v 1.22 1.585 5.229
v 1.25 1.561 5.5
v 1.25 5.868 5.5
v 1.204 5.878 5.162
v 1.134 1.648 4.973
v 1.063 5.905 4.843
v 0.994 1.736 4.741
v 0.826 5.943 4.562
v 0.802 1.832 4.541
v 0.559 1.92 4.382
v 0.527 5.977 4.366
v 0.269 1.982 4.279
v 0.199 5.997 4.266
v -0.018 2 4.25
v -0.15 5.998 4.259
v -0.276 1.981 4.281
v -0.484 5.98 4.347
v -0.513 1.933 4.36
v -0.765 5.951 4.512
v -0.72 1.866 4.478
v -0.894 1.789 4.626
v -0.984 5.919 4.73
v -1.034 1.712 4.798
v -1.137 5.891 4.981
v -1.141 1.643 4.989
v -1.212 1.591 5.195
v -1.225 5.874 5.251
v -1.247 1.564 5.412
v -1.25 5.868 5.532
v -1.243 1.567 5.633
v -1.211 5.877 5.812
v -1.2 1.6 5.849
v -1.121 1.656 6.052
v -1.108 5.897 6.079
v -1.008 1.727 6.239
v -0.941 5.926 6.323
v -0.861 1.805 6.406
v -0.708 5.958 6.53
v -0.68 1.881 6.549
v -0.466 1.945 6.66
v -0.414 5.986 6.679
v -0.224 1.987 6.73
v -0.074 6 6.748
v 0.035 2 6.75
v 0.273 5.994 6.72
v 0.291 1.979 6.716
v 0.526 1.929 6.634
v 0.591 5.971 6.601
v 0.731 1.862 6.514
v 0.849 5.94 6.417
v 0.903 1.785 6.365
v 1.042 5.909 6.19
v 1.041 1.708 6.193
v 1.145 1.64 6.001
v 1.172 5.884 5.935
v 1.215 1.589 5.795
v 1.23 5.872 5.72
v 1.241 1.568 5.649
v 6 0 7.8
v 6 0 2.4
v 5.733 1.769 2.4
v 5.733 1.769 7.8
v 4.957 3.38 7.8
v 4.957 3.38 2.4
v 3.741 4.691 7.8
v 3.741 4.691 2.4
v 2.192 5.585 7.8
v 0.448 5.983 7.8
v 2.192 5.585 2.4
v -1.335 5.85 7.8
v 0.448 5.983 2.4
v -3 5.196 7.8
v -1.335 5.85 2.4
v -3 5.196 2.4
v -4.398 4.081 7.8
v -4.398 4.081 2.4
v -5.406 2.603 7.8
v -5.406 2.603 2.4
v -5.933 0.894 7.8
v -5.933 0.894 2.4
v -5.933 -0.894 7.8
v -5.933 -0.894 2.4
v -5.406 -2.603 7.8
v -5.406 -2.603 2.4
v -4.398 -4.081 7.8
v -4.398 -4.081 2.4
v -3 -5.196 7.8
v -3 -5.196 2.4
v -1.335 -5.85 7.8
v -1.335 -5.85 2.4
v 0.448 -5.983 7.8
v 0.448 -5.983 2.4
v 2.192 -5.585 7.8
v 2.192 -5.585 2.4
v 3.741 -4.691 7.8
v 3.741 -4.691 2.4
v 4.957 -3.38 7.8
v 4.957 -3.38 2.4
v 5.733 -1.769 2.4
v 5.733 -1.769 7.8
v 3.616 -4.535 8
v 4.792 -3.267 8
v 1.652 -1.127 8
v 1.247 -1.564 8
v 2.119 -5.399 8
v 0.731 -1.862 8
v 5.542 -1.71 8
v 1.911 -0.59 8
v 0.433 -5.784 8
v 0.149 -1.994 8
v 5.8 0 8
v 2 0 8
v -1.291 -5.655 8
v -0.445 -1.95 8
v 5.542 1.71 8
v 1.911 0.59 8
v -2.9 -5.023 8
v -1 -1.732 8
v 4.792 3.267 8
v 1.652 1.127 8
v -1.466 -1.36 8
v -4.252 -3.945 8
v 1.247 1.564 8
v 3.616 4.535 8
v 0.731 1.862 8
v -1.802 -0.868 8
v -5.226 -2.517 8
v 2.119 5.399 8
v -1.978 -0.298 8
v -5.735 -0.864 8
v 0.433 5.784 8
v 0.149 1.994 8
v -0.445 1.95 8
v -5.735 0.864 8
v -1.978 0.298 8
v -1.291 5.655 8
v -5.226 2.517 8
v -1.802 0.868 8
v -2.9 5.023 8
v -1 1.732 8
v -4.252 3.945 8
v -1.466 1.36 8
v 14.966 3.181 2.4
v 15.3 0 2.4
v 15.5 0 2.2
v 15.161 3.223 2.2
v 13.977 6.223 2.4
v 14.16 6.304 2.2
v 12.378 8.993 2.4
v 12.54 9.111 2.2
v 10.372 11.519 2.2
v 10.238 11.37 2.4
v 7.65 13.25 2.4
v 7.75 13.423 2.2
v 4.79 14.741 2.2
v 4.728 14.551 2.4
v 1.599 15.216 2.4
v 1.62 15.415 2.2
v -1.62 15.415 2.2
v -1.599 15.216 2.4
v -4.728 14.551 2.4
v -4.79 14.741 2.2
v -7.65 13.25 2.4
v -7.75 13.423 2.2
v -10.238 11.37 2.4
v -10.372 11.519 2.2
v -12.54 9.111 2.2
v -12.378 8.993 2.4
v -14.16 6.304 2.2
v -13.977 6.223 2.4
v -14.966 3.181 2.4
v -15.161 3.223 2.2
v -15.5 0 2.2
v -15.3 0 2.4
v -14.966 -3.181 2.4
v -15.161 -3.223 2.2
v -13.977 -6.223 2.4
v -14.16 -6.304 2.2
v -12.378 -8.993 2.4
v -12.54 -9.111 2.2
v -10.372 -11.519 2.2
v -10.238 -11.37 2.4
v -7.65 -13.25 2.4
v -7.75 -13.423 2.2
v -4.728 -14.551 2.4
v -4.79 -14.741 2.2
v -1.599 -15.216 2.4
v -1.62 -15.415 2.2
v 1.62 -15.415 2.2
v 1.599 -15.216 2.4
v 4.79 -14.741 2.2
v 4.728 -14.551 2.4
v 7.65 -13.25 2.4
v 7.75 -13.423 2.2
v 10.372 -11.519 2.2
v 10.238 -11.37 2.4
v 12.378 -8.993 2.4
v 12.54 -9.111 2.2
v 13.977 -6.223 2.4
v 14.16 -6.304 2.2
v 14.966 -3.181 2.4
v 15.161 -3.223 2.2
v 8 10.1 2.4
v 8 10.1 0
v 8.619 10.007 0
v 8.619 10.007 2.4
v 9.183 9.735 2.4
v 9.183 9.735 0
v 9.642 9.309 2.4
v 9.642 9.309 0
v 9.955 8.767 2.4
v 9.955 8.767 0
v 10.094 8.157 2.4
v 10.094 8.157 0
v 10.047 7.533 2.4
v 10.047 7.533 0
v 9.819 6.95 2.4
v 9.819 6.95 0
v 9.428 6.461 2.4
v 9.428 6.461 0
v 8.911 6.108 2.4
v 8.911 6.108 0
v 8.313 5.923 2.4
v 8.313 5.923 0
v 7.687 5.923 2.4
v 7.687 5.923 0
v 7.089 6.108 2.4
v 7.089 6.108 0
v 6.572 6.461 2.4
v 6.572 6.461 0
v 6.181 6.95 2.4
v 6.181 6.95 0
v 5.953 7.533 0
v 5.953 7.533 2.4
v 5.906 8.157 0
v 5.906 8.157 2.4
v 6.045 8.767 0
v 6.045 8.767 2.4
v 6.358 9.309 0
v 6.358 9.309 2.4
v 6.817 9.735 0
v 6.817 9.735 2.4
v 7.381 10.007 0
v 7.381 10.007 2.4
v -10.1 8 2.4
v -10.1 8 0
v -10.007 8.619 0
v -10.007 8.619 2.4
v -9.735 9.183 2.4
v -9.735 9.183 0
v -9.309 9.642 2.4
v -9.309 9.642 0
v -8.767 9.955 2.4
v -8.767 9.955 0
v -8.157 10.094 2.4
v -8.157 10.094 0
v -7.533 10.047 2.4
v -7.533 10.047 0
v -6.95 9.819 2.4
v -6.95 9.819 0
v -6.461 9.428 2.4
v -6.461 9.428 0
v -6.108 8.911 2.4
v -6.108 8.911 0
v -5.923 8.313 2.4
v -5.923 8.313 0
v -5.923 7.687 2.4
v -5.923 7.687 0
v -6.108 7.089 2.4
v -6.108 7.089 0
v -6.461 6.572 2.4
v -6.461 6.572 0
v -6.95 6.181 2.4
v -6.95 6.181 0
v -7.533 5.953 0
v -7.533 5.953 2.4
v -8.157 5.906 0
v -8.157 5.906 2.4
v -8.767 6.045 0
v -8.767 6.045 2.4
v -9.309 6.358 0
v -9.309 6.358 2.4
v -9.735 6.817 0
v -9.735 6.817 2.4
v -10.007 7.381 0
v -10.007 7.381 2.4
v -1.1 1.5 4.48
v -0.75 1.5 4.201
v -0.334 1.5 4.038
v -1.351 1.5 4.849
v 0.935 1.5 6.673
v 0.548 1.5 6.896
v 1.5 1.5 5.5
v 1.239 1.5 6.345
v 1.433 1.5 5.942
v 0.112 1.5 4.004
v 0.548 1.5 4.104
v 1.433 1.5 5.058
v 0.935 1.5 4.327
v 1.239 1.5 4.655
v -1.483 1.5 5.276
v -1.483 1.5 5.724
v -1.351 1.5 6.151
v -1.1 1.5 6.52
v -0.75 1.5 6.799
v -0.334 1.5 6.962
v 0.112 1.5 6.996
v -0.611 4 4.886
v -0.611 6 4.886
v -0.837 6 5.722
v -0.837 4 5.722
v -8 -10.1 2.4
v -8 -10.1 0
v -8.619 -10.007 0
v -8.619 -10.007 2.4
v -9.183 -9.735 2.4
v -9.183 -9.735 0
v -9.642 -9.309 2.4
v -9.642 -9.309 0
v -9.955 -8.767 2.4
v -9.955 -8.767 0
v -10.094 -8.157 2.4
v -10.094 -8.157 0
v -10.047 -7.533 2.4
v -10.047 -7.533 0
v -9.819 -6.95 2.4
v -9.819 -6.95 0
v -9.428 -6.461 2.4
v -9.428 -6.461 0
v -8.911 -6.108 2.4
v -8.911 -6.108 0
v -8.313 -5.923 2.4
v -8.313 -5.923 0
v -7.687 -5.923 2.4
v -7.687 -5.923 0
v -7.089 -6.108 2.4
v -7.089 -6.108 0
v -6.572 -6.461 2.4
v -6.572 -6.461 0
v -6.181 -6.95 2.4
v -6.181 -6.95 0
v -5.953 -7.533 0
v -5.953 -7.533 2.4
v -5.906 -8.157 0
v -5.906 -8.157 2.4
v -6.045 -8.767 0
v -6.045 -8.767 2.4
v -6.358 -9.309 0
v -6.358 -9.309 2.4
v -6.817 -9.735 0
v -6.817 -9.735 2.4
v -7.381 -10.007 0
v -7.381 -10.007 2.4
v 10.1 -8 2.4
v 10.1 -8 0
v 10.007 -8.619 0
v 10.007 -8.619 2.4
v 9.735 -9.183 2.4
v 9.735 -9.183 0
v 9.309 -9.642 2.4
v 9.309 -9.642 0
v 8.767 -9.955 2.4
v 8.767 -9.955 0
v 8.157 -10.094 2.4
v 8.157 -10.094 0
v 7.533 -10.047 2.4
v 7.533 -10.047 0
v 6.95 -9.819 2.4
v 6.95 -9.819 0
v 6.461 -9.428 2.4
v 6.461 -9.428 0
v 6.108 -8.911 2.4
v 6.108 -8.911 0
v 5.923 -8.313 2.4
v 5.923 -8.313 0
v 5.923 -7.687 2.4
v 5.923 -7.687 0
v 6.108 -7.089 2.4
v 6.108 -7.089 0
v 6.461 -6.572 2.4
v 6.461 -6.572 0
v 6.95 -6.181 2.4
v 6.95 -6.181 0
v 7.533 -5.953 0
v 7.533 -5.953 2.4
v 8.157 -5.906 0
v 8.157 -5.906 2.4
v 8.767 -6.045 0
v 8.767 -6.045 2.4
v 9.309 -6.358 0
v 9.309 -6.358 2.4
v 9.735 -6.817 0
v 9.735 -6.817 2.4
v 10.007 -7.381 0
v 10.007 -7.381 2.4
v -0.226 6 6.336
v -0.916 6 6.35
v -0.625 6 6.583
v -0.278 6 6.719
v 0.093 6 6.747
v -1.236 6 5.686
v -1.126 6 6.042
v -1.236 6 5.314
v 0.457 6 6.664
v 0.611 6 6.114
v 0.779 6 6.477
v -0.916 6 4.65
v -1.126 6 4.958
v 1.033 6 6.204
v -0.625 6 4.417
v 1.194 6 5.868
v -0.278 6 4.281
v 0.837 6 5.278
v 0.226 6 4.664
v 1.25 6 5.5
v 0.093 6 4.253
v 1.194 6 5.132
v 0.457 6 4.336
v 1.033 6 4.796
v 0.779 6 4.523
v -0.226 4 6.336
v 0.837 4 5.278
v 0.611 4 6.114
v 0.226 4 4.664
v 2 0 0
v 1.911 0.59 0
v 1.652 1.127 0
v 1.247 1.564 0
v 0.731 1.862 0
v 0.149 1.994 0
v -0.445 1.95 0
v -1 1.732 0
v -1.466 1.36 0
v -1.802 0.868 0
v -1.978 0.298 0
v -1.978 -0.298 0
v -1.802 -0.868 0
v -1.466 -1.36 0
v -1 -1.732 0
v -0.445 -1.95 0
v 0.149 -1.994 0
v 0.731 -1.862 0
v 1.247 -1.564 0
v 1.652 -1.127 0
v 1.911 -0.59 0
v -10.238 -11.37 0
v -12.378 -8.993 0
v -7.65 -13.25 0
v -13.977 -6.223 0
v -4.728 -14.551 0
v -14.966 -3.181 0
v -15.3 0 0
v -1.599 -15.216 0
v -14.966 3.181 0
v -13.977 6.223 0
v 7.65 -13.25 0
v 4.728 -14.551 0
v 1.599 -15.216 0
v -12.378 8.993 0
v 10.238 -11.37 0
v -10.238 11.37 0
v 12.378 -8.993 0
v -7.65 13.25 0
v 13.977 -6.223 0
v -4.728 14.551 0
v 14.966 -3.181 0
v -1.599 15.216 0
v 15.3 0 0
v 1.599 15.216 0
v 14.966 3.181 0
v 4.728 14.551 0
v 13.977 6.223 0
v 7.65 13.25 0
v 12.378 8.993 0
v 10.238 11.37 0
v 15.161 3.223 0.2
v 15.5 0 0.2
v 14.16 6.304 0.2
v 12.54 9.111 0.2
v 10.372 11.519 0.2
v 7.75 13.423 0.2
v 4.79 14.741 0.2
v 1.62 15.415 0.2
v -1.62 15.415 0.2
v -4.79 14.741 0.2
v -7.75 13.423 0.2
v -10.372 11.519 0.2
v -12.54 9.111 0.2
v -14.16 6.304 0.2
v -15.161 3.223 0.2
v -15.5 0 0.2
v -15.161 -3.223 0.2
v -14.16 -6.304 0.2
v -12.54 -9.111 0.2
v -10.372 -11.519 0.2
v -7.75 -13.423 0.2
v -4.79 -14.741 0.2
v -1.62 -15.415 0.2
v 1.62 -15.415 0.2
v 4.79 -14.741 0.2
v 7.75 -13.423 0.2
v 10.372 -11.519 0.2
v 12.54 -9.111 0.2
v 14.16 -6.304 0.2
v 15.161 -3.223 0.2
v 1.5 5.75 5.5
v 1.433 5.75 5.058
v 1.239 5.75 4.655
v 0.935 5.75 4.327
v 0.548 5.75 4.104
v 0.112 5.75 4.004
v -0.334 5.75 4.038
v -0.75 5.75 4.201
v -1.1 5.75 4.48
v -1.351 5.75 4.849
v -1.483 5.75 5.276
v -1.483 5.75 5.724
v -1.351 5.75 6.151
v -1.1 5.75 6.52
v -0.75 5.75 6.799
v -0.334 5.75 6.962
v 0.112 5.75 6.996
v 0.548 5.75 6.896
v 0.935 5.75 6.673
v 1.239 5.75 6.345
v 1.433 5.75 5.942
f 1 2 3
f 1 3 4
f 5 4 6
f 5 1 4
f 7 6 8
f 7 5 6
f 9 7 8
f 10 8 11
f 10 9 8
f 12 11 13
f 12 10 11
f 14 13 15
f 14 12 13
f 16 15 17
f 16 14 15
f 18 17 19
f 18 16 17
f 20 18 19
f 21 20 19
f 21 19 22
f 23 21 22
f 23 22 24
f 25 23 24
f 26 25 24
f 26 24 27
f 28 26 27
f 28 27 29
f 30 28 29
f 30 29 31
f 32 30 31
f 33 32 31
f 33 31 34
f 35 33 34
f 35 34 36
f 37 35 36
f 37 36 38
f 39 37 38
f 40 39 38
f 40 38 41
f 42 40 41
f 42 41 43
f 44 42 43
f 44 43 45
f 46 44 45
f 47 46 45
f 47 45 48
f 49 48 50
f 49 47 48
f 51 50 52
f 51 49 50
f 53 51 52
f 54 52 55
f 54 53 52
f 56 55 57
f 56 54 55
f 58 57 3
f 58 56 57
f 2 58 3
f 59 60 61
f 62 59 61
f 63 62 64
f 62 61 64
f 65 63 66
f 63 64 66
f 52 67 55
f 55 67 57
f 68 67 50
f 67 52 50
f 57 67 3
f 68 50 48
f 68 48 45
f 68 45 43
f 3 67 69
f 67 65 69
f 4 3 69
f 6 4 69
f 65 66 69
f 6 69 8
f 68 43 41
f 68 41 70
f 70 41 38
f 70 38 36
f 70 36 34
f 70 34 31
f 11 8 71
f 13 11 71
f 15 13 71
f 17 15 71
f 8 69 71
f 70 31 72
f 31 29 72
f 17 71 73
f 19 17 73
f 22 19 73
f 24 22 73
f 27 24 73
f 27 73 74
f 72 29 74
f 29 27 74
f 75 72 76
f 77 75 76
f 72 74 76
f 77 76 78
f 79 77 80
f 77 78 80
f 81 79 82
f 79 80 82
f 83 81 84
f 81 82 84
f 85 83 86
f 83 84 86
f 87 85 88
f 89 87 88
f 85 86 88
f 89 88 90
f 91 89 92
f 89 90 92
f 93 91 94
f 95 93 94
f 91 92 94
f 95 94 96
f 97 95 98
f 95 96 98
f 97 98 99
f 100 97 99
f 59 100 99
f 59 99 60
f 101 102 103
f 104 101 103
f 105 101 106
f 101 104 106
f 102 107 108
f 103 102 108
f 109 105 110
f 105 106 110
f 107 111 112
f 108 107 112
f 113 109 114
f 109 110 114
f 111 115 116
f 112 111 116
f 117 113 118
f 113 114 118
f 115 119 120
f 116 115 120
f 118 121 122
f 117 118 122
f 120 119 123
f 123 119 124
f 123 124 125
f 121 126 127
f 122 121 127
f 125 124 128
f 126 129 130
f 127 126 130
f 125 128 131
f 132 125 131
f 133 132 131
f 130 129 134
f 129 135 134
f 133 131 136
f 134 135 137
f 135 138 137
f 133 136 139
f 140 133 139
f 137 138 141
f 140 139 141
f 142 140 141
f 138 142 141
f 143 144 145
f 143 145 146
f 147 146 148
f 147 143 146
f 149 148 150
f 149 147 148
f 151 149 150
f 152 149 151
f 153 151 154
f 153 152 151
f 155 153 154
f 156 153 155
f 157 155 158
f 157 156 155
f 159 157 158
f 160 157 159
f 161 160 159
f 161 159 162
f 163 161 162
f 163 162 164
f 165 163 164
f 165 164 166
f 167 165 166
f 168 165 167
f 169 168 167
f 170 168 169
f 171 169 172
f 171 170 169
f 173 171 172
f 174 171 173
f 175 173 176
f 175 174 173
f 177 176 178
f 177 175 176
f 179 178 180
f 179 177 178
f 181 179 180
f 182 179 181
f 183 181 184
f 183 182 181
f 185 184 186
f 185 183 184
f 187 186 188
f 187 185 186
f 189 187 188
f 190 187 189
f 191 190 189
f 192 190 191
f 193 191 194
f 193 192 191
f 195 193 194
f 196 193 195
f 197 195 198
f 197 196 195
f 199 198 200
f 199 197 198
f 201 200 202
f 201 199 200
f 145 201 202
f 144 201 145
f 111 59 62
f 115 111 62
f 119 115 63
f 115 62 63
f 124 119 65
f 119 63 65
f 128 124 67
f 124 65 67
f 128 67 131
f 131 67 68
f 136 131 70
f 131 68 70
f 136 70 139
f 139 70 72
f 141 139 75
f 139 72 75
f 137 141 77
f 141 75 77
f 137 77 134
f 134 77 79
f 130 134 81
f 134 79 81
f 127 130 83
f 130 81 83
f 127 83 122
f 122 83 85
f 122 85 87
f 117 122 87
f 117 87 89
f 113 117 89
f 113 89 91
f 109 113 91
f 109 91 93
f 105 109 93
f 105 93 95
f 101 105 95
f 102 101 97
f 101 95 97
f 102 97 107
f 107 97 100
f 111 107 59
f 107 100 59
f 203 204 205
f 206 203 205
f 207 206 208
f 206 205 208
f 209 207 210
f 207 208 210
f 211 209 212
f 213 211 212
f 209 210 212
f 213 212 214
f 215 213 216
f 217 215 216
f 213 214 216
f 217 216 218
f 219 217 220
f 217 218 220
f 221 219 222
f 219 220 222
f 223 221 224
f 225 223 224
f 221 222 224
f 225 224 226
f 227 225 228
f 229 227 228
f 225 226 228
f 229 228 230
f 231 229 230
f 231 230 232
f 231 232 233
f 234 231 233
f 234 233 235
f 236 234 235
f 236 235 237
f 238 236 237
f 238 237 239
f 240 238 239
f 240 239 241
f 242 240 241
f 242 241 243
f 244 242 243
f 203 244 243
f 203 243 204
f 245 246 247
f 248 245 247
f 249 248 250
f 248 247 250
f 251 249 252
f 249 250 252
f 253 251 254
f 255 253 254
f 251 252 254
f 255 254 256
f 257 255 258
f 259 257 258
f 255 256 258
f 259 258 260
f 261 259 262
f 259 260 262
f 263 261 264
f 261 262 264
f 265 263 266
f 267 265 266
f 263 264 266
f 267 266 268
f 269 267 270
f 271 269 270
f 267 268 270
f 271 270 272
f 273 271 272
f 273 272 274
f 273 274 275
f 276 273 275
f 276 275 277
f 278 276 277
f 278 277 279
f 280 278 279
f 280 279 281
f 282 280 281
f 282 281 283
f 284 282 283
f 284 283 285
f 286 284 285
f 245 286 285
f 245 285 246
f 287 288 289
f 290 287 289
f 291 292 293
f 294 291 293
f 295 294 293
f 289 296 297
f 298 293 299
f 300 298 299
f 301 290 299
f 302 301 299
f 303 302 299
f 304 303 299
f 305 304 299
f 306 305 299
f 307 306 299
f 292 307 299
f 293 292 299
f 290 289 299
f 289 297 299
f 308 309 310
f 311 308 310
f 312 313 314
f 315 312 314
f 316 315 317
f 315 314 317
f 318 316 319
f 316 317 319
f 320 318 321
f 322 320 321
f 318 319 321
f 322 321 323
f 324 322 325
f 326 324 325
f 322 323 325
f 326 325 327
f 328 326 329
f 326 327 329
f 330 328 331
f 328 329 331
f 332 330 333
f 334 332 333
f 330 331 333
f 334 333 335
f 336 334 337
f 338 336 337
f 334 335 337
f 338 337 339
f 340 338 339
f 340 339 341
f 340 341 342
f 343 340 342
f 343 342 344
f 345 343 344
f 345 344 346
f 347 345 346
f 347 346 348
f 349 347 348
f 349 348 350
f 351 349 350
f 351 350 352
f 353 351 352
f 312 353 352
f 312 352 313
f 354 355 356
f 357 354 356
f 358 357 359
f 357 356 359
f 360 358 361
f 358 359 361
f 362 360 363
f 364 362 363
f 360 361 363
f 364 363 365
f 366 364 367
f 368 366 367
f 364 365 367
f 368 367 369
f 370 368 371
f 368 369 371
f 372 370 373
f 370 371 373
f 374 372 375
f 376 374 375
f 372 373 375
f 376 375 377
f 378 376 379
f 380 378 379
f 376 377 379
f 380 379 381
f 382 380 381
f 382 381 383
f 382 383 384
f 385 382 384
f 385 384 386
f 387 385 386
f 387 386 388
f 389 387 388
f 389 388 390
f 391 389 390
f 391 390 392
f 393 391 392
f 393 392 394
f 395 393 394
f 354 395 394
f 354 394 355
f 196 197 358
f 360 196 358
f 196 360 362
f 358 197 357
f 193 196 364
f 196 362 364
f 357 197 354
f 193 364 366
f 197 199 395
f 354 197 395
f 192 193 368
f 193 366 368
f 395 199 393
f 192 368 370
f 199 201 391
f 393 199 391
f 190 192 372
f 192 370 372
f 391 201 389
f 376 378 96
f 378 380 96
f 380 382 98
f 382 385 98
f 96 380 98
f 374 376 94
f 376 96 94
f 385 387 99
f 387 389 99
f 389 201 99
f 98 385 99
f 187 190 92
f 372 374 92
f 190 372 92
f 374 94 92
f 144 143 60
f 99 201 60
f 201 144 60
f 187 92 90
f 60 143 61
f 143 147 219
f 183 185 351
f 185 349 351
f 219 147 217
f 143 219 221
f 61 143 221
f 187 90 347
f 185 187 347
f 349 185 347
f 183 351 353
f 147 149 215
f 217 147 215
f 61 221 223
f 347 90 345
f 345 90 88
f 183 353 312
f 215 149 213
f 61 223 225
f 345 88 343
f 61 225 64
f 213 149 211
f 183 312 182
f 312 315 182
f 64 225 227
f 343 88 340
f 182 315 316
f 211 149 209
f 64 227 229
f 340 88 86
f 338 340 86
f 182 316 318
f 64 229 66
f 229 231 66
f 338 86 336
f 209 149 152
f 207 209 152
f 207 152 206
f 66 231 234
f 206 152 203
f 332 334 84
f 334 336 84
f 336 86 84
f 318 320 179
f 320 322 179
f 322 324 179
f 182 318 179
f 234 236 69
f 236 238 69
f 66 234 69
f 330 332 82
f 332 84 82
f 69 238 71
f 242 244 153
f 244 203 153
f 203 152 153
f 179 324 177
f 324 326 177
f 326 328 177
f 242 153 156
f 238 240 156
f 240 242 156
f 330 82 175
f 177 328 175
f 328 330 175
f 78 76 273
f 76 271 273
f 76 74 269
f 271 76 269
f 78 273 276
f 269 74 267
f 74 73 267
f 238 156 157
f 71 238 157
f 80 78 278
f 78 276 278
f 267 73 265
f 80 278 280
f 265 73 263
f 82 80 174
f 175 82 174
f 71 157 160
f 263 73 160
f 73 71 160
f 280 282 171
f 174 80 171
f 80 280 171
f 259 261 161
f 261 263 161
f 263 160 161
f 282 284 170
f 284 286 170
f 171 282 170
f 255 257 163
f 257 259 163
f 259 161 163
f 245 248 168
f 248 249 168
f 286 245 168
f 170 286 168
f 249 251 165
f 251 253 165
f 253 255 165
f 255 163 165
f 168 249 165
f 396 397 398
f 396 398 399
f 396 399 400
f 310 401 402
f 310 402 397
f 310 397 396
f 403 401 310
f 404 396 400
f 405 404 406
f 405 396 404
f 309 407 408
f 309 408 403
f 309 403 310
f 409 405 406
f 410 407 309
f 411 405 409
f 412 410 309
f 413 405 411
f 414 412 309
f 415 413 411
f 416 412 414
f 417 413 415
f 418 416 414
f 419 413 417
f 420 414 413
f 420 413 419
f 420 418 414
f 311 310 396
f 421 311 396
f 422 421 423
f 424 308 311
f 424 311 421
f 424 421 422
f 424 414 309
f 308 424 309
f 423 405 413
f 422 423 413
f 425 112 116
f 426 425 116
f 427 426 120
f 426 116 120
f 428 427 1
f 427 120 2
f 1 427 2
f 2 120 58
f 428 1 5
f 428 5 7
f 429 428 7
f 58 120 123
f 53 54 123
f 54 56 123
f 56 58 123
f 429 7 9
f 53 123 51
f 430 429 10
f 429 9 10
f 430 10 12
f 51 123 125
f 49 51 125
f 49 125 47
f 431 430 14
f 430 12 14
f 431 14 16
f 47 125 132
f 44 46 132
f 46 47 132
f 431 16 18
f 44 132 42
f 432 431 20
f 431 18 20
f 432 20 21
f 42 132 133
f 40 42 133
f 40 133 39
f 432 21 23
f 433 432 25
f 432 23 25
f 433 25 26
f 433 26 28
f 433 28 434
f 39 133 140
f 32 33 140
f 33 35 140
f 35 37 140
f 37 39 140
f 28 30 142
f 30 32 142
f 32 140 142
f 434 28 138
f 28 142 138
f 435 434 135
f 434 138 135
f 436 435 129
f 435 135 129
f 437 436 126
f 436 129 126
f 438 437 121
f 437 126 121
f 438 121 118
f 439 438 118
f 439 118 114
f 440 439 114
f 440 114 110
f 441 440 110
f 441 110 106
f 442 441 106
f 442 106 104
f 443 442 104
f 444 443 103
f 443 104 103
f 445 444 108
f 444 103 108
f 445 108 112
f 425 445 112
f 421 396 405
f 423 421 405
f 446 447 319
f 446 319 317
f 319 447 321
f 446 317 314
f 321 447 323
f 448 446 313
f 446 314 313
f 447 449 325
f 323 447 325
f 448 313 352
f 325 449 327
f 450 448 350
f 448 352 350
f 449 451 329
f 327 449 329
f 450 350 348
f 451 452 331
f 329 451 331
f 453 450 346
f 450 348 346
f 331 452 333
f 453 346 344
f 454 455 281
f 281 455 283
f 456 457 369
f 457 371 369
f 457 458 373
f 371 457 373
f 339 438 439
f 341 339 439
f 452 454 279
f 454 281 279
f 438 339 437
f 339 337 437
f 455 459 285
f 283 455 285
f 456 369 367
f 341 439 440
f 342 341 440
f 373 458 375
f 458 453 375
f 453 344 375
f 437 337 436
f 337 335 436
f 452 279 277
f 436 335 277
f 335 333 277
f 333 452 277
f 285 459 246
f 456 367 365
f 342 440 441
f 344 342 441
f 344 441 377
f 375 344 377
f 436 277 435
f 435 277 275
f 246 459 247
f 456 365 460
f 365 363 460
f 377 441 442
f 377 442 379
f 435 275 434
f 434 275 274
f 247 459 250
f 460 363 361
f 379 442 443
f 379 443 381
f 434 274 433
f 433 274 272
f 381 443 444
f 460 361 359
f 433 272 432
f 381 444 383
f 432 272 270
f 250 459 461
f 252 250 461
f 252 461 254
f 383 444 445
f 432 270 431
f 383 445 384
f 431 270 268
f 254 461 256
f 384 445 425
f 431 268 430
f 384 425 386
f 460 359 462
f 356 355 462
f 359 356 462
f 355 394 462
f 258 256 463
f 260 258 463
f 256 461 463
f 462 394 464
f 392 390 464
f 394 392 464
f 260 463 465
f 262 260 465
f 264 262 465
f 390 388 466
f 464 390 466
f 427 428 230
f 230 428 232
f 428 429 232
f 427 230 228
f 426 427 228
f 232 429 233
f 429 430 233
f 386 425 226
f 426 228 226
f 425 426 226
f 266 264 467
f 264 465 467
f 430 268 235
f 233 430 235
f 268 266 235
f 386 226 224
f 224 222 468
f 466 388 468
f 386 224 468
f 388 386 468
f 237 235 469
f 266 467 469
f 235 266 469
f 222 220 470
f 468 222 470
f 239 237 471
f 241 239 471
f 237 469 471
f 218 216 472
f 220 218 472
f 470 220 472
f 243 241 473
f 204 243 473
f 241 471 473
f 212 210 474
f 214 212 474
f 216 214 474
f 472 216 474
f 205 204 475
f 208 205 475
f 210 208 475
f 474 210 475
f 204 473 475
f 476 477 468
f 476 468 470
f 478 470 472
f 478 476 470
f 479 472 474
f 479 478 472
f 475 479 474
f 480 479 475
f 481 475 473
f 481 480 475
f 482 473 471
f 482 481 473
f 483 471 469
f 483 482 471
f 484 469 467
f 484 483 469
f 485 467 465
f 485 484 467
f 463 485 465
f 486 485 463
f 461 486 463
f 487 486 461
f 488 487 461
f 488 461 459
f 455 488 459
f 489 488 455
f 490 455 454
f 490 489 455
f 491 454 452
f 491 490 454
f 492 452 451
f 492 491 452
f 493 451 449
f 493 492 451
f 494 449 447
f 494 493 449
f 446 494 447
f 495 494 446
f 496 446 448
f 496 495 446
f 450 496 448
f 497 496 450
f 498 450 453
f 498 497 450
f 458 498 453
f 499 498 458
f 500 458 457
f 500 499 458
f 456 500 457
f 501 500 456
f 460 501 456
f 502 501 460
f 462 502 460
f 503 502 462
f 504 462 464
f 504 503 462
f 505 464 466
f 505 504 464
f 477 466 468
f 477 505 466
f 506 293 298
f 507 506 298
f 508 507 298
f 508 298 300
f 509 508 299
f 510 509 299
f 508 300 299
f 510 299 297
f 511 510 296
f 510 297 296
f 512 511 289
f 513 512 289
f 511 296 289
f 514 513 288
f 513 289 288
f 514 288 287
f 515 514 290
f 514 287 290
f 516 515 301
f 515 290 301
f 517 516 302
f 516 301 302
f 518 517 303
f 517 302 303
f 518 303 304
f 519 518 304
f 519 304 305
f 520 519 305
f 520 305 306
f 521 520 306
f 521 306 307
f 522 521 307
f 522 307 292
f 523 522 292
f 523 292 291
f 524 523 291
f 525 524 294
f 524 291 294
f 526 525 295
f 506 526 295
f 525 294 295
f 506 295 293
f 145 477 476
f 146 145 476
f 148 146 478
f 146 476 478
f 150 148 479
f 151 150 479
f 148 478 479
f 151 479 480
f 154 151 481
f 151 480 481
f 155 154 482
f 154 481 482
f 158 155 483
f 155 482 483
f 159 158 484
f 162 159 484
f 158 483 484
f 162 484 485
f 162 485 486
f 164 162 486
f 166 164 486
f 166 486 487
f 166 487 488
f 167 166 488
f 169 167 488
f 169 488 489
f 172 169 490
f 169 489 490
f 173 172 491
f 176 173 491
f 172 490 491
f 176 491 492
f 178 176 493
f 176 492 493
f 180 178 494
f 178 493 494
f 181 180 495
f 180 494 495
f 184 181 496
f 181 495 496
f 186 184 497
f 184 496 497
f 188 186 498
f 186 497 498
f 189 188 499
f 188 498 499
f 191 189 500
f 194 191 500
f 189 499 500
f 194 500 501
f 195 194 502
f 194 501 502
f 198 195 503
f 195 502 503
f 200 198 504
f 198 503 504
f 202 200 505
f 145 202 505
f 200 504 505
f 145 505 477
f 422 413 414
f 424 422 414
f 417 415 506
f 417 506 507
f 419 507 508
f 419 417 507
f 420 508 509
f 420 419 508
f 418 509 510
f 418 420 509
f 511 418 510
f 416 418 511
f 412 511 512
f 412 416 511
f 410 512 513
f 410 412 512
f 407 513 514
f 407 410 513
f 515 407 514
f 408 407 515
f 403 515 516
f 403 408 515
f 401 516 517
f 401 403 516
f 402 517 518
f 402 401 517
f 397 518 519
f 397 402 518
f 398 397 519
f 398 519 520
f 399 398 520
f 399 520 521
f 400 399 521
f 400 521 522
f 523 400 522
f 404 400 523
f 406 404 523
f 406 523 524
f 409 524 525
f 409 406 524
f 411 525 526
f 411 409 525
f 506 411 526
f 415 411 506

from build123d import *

# Parameters (mm, degrees)
SKETCH2_R           = 1.25
CUT_EXTRUDE1_DEPTH  = 24.334523779
SKETCH3_R           = 2.1
CUT_EXTRUDE2_DEPTH  = 24.334523813
CIRPATTERN1_COUNT   = 4
CHAMFER1_SIZE       = 0.2
SKETCH4_R           = 1.5
BOSS_EXTRUDE1_DEPTH = 4.5
CHAMFER2_SIZE       = 0.25
CUT_EXTRUDE3_DEPTH  = 2


with BuildPart() as part:
    # Sketch1 → Revolve1 (revolve)
    with BuildSketch(Plane(origin=(0, 0, 0), x_dir=(1, 0, 0), z_dir=(0, 1, 0))):
        Polygon((2, 0), (2, -8), (6, -8), (6, -2.4), (15.5, -2.4), (15.5, 0), align=None)
    revolve(axis=Axis((0, 0, -122.457916377), (0, 0, 1)))

    # Sketch2 → Cut-Extrude1 (cut, through all)
    with BuildSketch(Plane(origin=(0, 0, 0), x_dir=(1, 0, 0), z_dir=(0, 1, 0))):
        with Locations((0, -5.5)):
            Circle(SKETCH2_R)
    extrude(amount=CUT_EXTRUDE1_DEPTH, mode=Mode.SUBTRACT)

    # Sketch3 → Cut-Extrude2 (cut, through all)
    with BuildSketch(Plane(origin=(0, 0, 0), x_dir=(-1, 0, 0), z_dir=(0, 0, -1))):
        with Locations((8, 8)):
            Circle(SKETCH3_R)
    cut_extrude2 = extrude(amount=-CUT_EXTRUDE2_DEPTH, mode=Mode.SUBTRACT)

    # CirPattern1: Cut-Extrude2 ×4 about axis
    cirpattern1_axis = Axis((0, 0, -7.656261881), (0, 0, 1))
    for i in range(1, CIRPATTERN1_COUNT):
        add(cut_extrude2.rotate(cirpattern1_axis, i * 360 / CIRPATTERN1_COUNT), mode=Mode.SUBTRACT)

    # Chamfer1
    chamfer1_edges = [part.edges().sort_by_distance(p)[0] for p in [
        (-6, 0, 8),
        (-15.5, 0, 2.4),
        (-15.5, 0, 0),
    ]]
    chamfer(chamfer1_edges, length=CHAMFER1_SIZE)


with BuildPart() as body_2:
    # Sketch4 → Boss-Extrude1 (new body)
    with BuildSketch(Plane(origin=(0, 1.5, 0), x_dir=(1, 0, 0), z_dir=(0, 1, 0))):
        with Locations((0, -5.5)):
            Circle(SKETCH4_R)
    extrude(amount=BOSS_EXTRUDE1_DEPTH)

    # Chamfer2
    chamfer2_edges = [body_2.edges().sort_by_distance(p)[0] for p in [
        (-1.5, 6, 5.5),
    ]]
    chamfer(chamfer2_edges, length=CHAMFER2_SIZE)

    # Sketch5 → Cut-Extrude3 (cut)
    with BuildSketch(Plane(origin=(0, 6, 0), x_dir=(1, 0, 0), z_dir=(0, 1, 0))):
        Polygon((0.837023085, -5.27775609), (0.22604267, -4.66399479), (-0.610980415, -4.8862387), (-0.837023085, -5.72224391), (-0.22604267, -6.33600521), (0.610980415, -6.1137613), align=None)
    extrude(amount=-CUT_EXTRUDE3_DEPTH, mode=Mode.SUBTRACT)


solid = Compound([part.part, body_2.part])
